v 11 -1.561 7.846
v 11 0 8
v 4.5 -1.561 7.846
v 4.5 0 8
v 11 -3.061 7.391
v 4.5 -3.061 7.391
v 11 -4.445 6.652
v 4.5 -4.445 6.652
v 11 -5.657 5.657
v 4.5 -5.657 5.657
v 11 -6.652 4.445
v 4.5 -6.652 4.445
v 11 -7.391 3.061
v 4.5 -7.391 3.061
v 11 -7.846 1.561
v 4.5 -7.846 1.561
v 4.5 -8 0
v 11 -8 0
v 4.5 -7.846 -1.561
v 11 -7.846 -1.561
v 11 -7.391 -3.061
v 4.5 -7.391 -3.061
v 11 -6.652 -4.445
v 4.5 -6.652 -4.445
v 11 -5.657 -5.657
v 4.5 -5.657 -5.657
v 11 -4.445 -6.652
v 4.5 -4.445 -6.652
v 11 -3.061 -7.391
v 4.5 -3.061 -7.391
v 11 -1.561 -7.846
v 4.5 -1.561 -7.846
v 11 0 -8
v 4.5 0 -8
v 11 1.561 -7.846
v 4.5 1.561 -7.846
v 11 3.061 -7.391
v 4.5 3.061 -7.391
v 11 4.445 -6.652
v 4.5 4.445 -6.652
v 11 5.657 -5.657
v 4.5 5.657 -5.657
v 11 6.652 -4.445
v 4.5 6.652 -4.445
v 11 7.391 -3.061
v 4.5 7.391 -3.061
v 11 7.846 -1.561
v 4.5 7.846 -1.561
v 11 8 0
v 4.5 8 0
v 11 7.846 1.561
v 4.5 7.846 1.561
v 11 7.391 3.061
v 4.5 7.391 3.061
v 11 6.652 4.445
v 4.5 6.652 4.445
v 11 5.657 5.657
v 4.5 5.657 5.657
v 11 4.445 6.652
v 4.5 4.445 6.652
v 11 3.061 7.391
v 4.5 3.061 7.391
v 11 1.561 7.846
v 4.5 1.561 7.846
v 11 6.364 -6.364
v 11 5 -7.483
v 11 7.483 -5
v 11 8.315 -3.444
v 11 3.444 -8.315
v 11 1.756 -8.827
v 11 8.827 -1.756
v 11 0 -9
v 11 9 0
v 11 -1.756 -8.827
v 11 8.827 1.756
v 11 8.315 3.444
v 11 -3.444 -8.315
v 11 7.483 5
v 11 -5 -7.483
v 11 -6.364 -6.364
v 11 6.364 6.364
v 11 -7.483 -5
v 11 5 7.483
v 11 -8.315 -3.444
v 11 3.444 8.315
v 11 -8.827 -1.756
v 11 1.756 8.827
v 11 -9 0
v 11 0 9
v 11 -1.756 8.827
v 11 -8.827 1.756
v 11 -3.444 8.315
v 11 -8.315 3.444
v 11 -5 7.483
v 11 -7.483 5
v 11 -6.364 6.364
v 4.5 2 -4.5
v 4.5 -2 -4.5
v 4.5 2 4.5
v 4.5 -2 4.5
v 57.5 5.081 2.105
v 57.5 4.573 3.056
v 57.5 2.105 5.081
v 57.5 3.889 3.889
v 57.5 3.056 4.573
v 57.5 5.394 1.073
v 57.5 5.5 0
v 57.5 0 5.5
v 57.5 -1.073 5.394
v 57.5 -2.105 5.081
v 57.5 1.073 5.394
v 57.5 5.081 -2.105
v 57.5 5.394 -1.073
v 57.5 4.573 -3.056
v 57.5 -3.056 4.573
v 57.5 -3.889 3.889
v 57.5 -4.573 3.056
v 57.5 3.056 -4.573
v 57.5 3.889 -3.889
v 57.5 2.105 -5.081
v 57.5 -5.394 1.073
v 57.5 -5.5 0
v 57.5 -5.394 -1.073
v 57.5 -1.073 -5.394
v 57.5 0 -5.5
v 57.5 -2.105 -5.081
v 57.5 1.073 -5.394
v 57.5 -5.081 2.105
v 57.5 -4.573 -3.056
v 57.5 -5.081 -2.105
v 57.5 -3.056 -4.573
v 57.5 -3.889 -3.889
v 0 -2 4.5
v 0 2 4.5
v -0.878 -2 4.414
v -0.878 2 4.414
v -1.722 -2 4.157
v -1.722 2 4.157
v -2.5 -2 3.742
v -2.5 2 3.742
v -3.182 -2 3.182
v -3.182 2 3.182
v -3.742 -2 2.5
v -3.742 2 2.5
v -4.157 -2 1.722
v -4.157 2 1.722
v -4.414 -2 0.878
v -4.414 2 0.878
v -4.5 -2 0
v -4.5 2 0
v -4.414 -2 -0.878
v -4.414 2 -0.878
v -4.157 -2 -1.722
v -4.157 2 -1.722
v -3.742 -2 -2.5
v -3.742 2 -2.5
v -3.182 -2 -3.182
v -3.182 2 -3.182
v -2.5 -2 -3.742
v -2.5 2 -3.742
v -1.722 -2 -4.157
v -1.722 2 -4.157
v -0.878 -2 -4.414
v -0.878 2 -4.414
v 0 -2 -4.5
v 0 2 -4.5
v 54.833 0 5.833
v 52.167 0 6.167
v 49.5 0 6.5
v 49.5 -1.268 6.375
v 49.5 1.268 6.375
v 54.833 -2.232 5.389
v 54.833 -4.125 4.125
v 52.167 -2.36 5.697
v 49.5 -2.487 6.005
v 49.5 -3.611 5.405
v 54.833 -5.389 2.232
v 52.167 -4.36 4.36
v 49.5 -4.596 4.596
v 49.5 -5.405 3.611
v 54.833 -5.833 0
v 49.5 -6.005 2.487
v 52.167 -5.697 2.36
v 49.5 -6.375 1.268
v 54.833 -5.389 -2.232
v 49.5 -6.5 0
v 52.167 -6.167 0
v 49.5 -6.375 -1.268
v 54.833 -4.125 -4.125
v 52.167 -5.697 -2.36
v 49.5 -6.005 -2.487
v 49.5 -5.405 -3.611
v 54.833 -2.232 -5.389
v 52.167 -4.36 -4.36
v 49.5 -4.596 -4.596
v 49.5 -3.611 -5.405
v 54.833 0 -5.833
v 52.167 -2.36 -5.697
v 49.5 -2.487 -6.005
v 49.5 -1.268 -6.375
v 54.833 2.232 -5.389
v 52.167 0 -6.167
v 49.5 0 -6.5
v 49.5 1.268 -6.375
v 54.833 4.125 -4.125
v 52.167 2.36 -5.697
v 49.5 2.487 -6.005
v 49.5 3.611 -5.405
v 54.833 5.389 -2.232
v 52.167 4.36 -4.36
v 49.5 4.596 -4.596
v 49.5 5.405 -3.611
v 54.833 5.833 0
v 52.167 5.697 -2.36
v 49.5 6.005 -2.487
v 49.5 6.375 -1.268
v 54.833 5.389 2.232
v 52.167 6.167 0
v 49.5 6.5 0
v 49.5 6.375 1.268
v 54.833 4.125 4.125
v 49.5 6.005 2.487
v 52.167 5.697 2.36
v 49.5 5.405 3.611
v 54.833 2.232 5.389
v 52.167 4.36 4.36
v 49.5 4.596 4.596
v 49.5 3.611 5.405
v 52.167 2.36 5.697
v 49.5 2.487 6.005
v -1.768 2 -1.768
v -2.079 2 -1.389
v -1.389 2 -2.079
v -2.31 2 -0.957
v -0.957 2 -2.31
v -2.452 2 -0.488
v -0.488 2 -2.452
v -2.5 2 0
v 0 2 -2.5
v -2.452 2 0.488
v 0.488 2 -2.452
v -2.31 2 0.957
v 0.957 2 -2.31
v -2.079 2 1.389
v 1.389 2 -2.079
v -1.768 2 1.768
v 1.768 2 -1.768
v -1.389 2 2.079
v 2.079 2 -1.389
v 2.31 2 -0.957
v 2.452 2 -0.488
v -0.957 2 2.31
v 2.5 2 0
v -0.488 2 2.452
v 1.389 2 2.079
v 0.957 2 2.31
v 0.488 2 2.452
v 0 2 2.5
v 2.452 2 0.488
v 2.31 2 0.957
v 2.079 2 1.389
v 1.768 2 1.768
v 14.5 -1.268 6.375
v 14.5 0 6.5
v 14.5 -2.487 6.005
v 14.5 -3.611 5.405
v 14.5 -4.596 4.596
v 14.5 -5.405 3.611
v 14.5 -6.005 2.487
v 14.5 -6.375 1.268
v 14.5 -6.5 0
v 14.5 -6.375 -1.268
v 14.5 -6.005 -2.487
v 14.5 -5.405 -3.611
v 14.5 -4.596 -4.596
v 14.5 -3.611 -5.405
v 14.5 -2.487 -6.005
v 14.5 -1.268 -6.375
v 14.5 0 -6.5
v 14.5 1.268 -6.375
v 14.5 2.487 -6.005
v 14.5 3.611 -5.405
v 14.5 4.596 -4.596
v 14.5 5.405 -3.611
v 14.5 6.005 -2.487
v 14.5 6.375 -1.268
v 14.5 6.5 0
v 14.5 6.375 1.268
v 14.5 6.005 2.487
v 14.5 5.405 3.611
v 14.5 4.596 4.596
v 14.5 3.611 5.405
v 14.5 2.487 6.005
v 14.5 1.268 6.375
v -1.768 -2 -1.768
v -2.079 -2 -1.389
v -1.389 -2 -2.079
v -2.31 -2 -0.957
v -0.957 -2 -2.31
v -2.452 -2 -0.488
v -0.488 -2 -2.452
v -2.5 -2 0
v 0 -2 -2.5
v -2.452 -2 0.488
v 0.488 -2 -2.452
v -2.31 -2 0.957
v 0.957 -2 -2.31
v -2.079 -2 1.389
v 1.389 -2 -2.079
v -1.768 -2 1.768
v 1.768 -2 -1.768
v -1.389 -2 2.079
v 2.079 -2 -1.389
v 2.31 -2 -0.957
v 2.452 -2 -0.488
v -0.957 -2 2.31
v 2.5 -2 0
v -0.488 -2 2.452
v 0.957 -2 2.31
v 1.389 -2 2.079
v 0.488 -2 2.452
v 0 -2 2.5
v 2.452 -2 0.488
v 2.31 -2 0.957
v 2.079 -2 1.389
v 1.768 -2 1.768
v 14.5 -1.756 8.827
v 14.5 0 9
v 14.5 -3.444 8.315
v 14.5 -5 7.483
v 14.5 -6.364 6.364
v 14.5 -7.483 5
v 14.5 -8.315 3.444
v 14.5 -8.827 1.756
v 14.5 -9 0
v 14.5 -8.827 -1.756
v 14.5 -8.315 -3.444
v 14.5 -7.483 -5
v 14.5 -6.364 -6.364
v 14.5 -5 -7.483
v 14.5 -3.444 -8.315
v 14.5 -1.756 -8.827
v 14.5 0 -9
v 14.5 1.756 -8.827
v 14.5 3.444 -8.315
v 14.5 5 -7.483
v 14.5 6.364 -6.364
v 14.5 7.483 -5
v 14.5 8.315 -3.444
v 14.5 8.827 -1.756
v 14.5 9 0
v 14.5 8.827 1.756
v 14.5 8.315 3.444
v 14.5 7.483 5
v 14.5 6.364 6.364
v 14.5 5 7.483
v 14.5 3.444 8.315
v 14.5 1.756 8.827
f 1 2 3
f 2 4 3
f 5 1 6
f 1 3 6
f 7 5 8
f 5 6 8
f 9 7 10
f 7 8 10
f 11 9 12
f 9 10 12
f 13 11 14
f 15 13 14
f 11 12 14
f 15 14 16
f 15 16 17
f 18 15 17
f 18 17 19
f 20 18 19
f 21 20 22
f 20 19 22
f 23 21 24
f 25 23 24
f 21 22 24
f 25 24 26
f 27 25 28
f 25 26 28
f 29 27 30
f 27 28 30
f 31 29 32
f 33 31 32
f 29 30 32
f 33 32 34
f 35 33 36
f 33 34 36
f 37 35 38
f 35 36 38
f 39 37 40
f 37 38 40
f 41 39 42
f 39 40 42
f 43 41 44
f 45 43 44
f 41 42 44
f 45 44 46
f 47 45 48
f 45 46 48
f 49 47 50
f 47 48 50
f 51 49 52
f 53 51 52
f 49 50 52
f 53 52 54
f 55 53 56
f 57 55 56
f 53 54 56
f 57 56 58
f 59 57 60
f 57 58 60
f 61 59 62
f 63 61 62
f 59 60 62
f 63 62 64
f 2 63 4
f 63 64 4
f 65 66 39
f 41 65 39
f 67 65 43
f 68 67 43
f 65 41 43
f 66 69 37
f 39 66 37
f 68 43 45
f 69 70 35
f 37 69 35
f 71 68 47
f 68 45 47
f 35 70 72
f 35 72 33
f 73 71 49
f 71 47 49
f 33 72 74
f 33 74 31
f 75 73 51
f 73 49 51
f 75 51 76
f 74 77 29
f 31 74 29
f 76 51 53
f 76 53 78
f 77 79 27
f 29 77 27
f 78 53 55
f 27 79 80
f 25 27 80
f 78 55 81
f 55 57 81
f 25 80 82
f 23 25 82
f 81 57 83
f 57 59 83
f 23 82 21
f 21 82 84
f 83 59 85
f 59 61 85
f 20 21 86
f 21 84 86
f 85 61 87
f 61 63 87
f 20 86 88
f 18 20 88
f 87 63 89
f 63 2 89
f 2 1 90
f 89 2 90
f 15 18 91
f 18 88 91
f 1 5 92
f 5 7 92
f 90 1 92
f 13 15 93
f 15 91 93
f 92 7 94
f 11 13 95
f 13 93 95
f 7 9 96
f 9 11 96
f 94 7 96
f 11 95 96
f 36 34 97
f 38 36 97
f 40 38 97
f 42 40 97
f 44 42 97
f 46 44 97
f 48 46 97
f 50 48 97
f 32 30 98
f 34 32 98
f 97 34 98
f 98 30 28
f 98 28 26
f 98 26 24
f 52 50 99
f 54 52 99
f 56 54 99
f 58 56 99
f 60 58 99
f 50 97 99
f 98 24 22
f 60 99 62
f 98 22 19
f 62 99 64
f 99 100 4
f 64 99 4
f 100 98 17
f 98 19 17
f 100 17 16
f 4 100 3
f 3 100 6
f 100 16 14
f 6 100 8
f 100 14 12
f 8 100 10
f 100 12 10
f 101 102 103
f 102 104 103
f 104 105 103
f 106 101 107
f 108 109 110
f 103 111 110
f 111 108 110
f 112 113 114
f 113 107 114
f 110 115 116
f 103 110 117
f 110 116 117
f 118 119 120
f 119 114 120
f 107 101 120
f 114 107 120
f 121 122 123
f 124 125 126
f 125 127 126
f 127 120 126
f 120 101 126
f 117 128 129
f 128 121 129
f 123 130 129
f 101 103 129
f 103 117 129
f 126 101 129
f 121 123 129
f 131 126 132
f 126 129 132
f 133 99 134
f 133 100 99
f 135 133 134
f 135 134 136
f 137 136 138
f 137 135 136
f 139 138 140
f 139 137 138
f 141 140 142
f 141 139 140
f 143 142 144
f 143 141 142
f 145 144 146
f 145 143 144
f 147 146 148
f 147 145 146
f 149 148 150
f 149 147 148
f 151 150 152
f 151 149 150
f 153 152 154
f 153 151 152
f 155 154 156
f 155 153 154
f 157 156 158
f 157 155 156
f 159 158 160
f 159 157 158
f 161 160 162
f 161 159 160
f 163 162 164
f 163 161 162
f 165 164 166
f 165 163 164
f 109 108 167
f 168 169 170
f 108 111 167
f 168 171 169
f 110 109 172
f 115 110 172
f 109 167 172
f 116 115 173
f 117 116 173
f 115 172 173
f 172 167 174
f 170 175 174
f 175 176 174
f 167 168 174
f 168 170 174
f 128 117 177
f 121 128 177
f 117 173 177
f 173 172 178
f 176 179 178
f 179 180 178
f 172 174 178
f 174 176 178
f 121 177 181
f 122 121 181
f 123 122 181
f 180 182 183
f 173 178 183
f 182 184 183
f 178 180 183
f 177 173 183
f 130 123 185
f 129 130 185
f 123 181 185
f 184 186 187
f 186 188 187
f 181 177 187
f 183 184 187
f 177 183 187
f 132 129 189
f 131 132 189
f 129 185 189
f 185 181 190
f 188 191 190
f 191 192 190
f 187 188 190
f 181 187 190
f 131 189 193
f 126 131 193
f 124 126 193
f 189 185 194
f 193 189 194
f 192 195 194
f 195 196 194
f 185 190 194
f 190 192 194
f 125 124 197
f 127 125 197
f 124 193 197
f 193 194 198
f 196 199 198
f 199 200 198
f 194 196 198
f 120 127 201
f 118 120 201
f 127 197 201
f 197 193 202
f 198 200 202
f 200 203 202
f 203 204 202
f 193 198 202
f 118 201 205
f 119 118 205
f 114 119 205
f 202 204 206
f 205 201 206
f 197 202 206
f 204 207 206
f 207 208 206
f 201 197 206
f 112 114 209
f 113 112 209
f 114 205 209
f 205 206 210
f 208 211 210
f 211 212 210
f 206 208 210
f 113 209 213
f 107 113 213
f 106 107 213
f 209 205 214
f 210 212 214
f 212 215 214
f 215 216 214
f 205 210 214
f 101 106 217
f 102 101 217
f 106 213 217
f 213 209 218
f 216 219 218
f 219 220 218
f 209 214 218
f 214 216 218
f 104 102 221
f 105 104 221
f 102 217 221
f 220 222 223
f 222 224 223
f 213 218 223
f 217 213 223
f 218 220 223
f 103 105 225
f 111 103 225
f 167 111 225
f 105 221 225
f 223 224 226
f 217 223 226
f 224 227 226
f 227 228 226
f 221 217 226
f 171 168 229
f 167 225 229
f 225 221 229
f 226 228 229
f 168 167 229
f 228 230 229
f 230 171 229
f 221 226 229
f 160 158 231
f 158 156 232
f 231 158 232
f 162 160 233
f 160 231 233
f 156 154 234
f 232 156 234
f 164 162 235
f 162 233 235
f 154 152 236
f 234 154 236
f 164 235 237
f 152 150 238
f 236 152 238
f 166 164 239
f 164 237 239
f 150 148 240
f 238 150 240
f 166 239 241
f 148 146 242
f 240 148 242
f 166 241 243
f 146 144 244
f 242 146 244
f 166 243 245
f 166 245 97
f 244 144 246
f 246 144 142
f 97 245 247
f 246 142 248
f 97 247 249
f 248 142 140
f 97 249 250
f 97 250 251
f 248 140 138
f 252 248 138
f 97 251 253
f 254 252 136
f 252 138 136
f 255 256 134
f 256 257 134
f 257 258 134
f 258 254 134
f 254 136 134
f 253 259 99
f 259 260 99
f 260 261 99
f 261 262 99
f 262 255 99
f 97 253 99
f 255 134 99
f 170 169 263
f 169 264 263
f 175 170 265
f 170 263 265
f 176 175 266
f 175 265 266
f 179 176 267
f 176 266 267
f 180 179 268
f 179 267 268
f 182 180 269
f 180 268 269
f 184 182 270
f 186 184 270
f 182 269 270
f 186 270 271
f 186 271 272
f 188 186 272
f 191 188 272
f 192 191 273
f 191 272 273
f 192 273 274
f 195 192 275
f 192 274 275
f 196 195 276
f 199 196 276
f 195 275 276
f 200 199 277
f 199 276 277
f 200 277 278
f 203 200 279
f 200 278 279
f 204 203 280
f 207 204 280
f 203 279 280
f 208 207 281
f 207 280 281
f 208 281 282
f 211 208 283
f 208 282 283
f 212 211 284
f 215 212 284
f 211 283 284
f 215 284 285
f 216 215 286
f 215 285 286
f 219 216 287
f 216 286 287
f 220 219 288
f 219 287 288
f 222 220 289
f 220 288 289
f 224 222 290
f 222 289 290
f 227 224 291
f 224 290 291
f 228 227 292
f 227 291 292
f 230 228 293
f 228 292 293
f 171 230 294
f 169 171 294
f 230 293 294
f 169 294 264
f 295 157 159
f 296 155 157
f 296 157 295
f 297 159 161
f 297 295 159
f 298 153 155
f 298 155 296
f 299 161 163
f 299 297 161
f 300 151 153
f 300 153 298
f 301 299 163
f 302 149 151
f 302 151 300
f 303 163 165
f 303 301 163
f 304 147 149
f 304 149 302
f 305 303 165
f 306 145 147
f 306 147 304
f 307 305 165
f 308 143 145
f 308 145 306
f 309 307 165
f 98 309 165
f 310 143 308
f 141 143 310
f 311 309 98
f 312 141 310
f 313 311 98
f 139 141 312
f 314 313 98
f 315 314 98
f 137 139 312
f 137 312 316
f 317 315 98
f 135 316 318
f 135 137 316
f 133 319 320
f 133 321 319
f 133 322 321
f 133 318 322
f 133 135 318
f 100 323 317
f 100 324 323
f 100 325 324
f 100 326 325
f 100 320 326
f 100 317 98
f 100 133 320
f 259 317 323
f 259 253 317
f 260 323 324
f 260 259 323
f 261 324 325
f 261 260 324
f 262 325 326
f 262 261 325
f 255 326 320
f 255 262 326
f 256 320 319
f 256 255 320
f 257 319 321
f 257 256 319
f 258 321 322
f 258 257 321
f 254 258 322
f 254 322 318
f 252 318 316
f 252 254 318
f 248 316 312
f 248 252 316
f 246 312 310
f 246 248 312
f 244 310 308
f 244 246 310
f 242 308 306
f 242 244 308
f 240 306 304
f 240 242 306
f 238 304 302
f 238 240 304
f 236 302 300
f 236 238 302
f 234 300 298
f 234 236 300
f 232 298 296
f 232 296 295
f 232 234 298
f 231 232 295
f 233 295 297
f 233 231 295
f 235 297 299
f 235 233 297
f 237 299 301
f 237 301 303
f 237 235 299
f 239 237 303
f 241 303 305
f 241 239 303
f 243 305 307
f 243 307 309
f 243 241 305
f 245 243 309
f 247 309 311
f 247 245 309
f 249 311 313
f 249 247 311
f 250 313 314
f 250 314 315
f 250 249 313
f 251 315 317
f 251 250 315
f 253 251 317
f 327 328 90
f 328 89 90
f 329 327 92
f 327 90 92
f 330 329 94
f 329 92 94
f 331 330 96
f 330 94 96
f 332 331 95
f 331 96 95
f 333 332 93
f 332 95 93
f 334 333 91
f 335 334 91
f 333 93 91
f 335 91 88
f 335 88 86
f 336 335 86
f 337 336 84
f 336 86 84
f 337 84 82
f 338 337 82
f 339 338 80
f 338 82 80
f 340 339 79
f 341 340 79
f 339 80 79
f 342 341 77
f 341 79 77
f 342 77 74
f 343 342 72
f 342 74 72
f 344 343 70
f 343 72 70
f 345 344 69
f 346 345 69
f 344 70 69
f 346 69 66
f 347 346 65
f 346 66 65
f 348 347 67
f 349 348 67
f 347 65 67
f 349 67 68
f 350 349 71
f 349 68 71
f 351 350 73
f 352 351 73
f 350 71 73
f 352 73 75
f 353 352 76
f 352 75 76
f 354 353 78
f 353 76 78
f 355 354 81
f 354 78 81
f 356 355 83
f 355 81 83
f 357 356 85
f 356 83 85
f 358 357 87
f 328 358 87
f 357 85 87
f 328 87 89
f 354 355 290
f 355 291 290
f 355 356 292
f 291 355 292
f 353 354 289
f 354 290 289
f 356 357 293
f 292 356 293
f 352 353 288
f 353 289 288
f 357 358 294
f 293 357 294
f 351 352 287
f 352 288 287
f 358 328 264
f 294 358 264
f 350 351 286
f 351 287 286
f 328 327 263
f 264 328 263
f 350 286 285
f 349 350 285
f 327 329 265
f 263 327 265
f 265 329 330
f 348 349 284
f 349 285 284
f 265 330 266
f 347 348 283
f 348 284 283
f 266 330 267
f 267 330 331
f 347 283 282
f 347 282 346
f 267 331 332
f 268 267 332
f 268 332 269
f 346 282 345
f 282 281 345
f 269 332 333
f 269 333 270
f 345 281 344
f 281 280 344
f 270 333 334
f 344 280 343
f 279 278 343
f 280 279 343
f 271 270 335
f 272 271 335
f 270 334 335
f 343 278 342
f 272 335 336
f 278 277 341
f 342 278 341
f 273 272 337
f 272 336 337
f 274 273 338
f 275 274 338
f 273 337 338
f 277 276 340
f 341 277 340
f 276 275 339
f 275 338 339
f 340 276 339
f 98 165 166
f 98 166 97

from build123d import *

# Parameters (mm, degrees)
F0_R     = 2.5
F1_DEPTH = 2


# Not quite as in the source:
# - a feature names something its author has since deleted; it is built from what else it names


with BuildPart() as f1:
    # F0 (on Front) → F1 (new body, symmetric)
    with BuildSketch(Plane.XZ):
        with BuildLine():
            Line((4.5, 4.5), (0, 4.5))
            ThreePointArc((0, 4.5), (-4.5, 0), (0, -4.5))
            Line((0, -4.5), (4.5, -4.5))
            Line((4.5, -4.5), (4.5, 0))
            Line((4.5, 0), (4.5, 4.5))
        make_face()
        Circle(F0_R, mode=Mode.SUBTRACT)
    extrude(amount=F1_DEPTH, both=True)

    # F0 (on Front) → F2 (revolve)
    with BuildSketch(Plane.XZ):
        Polygon((4.5, 8), (4.5, 4.5), (4.5, 0), (57.5, 0), (57.5, 5.5), (49.5, 6.5), (14.5, 6.5), (14.5, 9), (11, 9), (11, 8), align=None)
    revolve(axis=Axis((31, 0, 0), (1, 0, 0)))


solid = f1.part
